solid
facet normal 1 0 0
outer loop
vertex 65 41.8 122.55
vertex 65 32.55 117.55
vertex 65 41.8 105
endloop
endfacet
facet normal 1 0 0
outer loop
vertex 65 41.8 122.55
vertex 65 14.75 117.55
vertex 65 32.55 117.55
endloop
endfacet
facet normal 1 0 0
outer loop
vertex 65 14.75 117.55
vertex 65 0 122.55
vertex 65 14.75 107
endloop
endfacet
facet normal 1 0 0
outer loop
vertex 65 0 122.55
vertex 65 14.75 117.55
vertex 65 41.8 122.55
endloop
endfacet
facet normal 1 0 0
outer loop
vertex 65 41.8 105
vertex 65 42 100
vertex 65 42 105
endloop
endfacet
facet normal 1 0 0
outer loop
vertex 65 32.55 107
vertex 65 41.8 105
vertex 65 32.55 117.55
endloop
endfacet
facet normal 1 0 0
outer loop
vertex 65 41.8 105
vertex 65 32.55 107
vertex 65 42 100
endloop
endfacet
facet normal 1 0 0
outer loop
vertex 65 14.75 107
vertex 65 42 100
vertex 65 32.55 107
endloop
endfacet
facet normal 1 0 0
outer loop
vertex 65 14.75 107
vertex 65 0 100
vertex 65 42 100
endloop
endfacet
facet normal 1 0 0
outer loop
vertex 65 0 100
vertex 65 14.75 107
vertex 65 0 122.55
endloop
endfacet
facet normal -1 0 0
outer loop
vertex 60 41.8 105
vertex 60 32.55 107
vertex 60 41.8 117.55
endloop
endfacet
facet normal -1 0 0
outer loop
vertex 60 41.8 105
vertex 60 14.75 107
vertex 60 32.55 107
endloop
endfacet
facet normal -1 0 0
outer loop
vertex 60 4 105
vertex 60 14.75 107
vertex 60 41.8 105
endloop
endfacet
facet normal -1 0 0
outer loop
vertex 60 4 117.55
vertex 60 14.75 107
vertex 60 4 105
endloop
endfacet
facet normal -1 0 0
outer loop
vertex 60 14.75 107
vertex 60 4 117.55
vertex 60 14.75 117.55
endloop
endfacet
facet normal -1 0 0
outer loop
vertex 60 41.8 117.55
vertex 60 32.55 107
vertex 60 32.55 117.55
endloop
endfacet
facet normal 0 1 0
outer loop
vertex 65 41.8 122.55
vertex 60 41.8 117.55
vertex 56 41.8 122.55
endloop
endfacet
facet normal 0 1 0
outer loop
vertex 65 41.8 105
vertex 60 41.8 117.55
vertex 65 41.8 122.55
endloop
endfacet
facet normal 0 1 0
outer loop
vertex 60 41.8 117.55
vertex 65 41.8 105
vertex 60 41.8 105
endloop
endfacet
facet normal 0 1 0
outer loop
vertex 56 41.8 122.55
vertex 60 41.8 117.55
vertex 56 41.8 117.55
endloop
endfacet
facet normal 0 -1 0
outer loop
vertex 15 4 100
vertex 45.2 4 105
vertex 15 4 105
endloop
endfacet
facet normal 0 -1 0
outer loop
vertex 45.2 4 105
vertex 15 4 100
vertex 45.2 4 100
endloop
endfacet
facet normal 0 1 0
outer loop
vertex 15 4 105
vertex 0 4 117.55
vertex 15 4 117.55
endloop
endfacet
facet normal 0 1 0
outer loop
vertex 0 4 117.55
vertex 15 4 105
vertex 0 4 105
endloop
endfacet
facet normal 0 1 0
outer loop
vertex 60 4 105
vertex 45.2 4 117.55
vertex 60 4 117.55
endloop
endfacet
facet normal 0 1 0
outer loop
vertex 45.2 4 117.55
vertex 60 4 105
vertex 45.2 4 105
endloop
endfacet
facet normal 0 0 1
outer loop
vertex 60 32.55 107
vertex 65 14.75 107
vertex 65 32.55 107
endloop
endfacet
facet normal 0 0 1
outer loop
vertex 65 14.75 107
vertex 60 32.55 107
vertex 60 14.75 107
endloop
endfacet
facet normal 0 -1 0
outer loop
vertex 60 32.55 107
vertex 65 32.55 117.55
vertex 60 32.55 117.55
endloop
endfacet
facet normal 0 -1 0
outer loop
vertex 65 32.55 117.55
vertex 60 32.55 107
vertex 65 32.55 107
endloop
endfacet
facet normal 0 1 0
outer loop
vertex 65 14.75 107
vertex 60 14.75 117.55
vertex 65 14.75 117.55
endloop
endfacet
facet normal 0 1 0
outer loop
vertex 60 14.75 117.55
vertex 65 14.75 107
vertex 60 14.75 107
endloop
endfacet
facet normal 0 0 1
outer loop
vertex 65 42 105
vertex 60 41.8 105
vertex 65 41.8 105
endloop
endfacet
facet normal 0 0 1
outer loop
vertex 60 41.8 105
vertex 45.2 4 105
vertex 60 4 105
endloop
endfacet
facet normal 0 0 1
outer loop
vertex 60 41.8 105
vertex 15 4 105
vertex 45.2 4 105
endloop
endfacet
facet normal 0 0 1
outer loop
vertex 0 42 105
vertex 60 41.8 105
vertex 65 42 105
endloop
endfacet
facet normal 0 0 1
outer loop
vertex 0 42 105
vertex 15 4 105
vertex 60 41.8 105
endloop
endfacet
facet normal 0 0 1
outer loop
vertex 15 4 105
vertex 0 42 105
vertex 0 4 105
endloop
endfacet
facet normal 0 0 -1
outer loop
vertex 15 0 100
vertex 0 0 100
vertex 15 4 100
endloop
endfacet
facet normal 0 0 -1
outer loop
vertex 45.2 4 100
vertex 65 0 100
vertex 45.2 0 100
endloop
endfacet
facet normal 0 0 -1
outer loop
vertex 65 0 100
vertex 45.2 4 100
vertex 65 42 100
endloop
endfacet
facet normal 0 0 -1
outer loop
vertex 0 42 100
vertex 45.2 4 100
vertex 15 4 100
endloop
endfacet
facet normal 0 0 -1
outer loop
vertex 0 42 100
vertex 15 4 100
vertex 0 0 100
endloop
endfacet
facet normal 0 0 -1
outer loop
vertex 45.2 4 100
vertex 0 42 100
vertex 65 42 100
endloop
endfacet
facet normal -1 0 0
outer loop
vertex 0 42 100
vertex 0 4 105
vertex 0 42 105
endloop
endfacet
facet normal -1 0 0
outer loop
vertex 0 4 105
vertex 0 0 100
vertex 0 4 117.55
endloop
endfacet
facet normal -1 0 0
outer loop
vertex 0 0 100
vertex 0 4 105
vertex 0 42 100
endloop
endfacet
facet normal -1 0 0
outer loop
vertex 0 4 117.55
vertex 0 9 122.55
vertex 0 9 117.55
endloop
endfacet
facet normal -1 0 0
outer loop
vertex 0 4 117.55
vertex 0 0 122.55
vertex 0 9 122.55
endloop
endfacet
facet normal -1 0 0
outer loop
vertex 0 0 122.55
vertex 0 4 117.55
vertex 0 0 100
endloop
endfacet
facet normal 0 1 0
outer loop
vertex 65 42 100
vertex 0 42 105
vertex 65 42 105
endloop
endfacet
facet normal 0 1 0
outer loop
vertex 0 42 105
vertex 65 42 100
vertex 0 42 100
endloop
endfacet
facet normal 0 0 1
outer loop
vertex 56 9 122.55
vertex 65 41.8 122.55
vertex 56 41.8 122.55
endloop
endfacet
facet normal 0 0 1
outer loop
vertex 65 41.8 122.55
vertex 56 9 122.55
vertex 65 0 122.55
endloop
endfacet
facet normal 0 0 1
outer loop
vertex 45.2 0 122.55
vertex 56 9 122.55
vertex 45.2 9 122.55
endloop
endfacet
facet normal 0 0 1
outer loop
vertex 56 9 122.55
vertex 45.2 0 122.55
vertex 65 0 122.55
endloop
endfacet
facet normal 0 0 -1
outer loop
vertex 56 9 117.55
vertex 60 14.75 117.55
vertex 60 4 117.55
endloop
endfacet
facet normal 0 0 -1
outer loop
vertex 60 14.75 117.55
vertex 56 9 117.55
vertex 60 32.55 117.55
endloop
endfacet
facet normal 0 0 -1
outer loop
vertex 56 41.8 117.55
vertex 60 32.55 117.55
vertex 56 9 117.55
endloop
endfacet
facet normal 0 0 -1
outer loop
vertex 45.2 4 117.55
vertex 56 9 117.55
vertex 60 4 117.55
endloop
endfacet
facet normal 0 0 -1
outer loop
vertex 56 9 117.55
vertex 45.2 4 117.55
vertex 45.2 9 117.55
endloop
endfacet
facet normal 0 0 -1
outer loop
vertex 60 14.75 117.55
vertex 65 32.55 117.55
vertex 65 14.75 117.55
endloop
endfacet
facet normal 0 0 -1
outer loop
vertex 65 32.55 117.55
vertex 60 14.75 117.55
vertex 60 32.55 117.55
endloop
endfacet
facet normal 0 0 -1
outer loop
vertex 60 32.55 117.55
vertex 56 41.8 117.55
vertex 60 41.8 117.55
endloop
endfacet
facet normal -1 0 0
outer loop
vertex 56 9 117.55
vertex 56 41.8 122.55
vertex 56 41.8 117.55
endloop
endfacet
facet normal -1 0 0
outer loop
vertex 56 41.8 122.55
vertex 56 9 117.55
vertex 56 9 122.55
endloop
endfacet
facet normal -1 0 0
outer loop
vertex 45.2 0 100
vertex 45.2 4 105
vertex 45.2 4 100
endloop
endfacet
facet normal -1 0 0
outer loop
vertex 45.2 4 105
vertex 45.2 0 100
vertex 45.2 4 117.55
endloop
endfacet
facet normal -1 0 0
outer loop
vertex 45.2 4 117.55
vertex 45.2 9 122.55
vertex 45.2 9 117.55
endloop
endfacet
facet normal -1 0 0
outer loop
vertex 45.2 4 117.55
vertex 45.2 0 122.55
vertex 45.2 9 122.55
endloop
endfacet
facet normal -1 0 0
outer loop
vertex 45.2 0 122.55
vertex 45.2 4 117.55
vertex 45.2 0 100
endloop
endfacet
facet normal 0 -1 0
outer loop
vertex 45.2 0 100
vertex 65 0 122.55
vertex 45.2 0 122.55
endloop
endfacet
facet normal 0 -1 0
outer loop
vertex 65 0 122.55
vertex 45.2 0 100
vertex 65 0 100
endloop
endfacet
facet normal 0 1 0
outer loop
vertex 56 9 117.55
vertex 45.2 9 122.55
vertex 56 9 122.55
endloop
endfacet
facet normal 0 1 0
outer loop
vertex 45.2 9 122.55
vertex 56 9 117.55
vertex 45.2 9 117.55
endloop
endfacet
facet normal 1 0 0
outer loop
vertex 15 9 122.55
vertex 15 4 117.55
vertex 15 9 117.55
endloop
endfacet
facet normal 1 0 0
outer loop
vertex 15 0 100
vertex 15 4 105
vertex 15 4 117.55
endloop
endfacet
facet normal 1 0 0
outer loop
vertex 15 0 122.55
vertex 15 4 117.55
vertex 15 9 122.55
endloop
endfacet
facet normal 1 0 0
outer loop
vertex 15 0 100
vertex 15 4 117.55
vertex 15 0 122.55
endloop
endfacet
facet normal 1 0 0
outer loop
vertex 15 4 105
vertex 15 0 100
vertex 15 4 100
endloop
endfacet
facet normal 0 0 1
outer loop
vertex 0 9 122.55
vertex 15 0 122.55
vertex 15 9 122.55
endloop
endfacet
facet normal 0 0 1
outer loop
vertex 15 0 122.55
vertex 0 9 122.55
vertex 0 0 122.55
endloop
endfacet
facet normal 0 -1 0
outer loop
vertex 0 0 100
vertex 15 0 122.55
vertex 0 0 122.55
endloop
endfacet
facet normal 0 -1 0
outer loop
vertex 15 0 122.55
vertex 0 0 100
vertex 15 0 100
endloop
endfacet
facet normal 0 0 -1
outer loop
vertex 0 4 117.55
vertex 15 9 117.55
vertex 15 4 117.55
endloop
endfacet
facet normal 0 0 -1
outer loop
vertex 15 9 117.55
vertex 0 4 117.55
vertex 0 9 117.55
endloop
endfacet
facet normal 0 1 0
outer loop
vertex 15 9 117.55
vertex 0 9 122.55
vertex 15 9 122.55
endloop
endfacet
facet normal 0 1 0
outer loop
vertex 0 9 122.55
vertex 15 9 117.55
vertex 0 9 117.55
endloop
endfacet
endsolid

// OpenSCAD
// file: ../robot_settings.scad
main_box_x = 100; // 96
main_box_y = 102;
main_box_z = 74; // 74.5

lfp_main_box_x = 65;
lfp_main_box_y = 151;
lfp_main_box_z = 95;

wall_thickness = 2;

rail_gap = 2;
rail_inset = 7;

rail_thickness = 7;
rail_length = 250;
rail_width = 250;

raspberry_pi_screw_seperation_y = 57;
raspberry_pi_screw_seperation_z = 48;
raspberry_pi_peg_h = 5;

battery_box_peg_h = 6;
battery_box_peg_d = 8;
battery_box_peg_cutout = 5;

gears_module = 1;
pinion_gear_teeth = 32;
pinion_gear_width = 5;
pinion_gear_bore = 8;

gears_setback_distance = 25;
gear_post_height = 2 * pinion_gear_width + rail_thickness + 8 ;

steering_motor_mount_x = 45;
steering_motor_mount_y = 36;
steering_motor_mount_z = 18;
steering_motor_mount_setback_distance = gears_setback_distance + 16;

dc_motor_drivertype = "Teyleten"; // Teyleten
isAdafruit = (dc_motor_drivertype == "Adafruit");

drv8871_x = isAdafruit ? 20.3 : 21.6;
drv8871_y = isAdafruit ?  24 : 25;

drv8871_z = 2;
drv8871_screw_d = 2.5;
drv8871_solder_points_z = 2;

drv8871mount_edge_x = 1.5;
drv8871mount_edge_wall = 3;
drv8871mount_z = 5;
drv8871mount_x = drv8871_x +  drv8871mount_edge_wall - 2* drv8871mount_edge_x;
drv8871mount_y = 19;

drv8871_screw_distance = 15.64;
drv8871_solder_points_d = 1.66;
drv8871_solder_offset_y = 4.4;
drv8871_solder_inner_points_distance = 5;
drv8871_solder_outer_points_distance = 12;

dc_motor_75_1_housing_minus_encoder_z = 53.8;
dc_motor_75_1_encoder_z = 14.75;
dc_motor_housing_minus_encoder_z = 48;
dc_motor_encoder_z = 9.33;
dc_motor_encoder_wheel_d = 13.4;
dc_motor_encoder_wheel_thickness = 5;
dc_motor_encoder_wheel_gap = 3;
dc_motor_encoder_circuit_thickness = 2;
dc_motor_cutout_d = 24.8;
dc_motor_cutout_z = 19.5;


M3_shaft_d = 2.82;

dc_motor_screw_head_z = 2;
dc_motor_screw_head_d = 5.6;
dc_motor_screw_d = 3.2;
dc_motor_screw_offset = 8.5;

dc_motor_axle_ring_z = 3;
dc_motor_axle_ring_d = 7.2;
dc_motor_axle_cutout_d = 4.2;
dc_motor_axle_cutout_z = 10;
dc_motor_axle_notch_cutout = 0.4;
dc_motor_axle_notch_cutout_z = 6;

pdmount_x = 20;
pdmount_y = 30;
pdmount_z = 2;
pdmount_edge_x = 1.5;
pdmount_edge_wall = 3;

steering_shaft_z = 45;
steering_shaft_d = 7;
steering_shaft_motor_fitting_d = 9;
coupler_length = 24.6;
coupler_diameter = 14;
coupler_screw_d = 4;
coupler_screw_z_offset = 5;
coupler_gear_side_insert = 12.6;
steering_shaft_with_coupler_z = steering_shaft_z - coupler_gear_side_insert;

lidar_mount_y = 110;
lidar_mount_x = 65 + 20;
lidar_narrow_screws = 40;
lidar_wide_screws = 56;
lidar_front_to_back_screws = 70;
lidar_screw_d = 3;
lidar_circuitboard_x = 20;
lidar_circuitboard_y = 35;
lidar_circuitboard_z = 1.2;
lidar_cord_length = 29;

ball_bearing_height = 7;
ball_bearing_outer_diameter = 22;
ball_bearing_inner_diameter = 8;

M4_diameter = 5.1;
M3_diameter = 2.9;
M3_length = 35;
M3_cap_length= 3;
M3_cap_diameter = 5.44;

suspension_spring_outer_diameter = 8;
suspension_spring_inner_diameter = 5.3;

armature_holder_height = 20;
armature_holder_thickness = 8;
pull_bar_peg_r = 3.2;
apparatus_locking_peg_d = 4;

rack_module = 1;
rack_length = main_box_x;
rack_height = 5;
rack_width = 10;
rack_teeth = 30;
rack_bore = 3;

pull_bar_length = rail_width / 2 - rack_length + 1;

// tire hardware
axle_length = 24 + ball_bearing_height; 
axle_reciever_inner_diameter = 8.2;
axle_reciever_outer_diameter = 12;
axle_reciever_length = 18.8;
axle_notch_length = 15;
axle_notch_cutout = 2.4;

// power distribution bar
power_bar_cutout_x = 96;
power_bar_y = 19.1;
power_bar_z = 1.5;
power_bar_screw_distance = 91.4;
power_bar_screw_d = 2.8;
power_bar_standoff_z = 5;
power_bar_standoff_d = 6.83;

pico_expander_width = 63;
pico_expander_height = 57;
pico_screw_hole_offset = 3;
pico_screw_hole_d = 2.5;

usbhub_thickness = 11.7;
usbhub_depth = 37.5;
usbhub_width = 86.7;
usbhub_end_port_width = 14.8;
usbhub_end_port_height = 12;
usbhub_front_face_safe_zone_left = 15;
usbhub_front_face_safe_zone_right = 14.8;

switch_w = 16;
switch_cutout_d = 12.2;
switch_bump_h = 2;
switch_bump_l = 18.2;

i2c_mount_thickness = 3;
i2c_w = 28;
i2c_l = 28;
i2c_circuitboard_thickness = 1.23;
i2c_bottom_notch_w = 14.35;
i2c_bottom_notch_depth = 1;
i2c_screw_hole_d = 1.9;
i2c_screw_hole_offset = 1.4;
i2c_pin_l = 11;
i2c_pin_d = 0.8;
i2c_pin_offset = 1.5;
i2c_pin_separation = 2.5;
i2c_all_pins_l = 8.3;
i2c_screen_thickness = 1.88;
i2c_screen_w = 14.6;
i2c_screen_d = 27;
i2c_screen_offset = 4.1;
// main file
include <../robot_settings.scad>

module targus4mount()
{
   spacer = 5;
  
  // spacers to allow for better usb fit
  // main spacer
  translate([0,4, lfp_main_box_z + spacer])
  cube([lfp_main_box_x,  38, spacer]);
  
//  // right side spacer
//  translate([lfp_main_box_x -15, 0, lfp_main_box_z + spacer])
//  cube([15, 3, spacer]);
  
  // small right side wall filler
//  translate([lfp_main_box_x -19.8, 4, lfp_main_box_z + spacer + 1])
//  cube([4.8, 2, spacer - 1]);
  
//  // left side spacer
//  translate([0, 0, lfp_main_box_z + spacer])
//  cube([15, 4, spacer]);
  
  // holders for Targus 4 port
  difference() {
    // end wall
    translate([lfp_main_box_x - 5, 4, lfp_main_box_z + usbhub_thickness / 2 ])
    cube([5, usbhub_depth + .3, usbhub_thickness + usbhub_thickness / 2 + spacer - 1]);
    
    // usb cutout
     color("green")
    translate([lfp_main_box_x - 6, usbhub_depth / 2 -4 , lfp_main_box_z + usbhub_end_port_height])
    cube([7, usbhub_end_port_width + 3, usbhub_end_port_height]);
  }

  // end roof
  translate([lfp_main_box_x - 9, 4.3, lfp_main_box_z + usbhub_thickness + usbhub_thickness / 2 + spacer])
  cube([9, usbhub_depth, 5]);
  
  // side right wall
  translate([lfp_main_box_x - usbhub_front_face_safe_zone_right - 5, 0, lfp_main_box_z + 5])
  cube([usbhub_front_face_safe_zone_right + 5, 4, usbhub_thickness  + usbhub_thickness / 2 + spacer]);
  
  // side right roof
   translate([lfp_main_box_x - usbhub_front_face_safe_zone_right - 5, 0, lfp_main_box_z + usbhub_thickness + usbhub_thickness / 2 + spacer])
   cube([usbhub_front_face_safe_zone_right + 5, 9, 5]);
 
  // side left wall
  translate([0, 0, lfp_main_box_z + 5])
  cube([usbhub_front_face_safe_zone_left , 4, usbhub_thickness  + usbhub_thickness / 2 + spacer]);
  
  // side left roof
  translate([0, 0, lfp_main_box_z + usbhub_thickness + usbhub_thickness / 2  + spacer])
   cube([usbhub_front_face_safe_zone_left, 9, 5]);
 
}
targus4mount();
